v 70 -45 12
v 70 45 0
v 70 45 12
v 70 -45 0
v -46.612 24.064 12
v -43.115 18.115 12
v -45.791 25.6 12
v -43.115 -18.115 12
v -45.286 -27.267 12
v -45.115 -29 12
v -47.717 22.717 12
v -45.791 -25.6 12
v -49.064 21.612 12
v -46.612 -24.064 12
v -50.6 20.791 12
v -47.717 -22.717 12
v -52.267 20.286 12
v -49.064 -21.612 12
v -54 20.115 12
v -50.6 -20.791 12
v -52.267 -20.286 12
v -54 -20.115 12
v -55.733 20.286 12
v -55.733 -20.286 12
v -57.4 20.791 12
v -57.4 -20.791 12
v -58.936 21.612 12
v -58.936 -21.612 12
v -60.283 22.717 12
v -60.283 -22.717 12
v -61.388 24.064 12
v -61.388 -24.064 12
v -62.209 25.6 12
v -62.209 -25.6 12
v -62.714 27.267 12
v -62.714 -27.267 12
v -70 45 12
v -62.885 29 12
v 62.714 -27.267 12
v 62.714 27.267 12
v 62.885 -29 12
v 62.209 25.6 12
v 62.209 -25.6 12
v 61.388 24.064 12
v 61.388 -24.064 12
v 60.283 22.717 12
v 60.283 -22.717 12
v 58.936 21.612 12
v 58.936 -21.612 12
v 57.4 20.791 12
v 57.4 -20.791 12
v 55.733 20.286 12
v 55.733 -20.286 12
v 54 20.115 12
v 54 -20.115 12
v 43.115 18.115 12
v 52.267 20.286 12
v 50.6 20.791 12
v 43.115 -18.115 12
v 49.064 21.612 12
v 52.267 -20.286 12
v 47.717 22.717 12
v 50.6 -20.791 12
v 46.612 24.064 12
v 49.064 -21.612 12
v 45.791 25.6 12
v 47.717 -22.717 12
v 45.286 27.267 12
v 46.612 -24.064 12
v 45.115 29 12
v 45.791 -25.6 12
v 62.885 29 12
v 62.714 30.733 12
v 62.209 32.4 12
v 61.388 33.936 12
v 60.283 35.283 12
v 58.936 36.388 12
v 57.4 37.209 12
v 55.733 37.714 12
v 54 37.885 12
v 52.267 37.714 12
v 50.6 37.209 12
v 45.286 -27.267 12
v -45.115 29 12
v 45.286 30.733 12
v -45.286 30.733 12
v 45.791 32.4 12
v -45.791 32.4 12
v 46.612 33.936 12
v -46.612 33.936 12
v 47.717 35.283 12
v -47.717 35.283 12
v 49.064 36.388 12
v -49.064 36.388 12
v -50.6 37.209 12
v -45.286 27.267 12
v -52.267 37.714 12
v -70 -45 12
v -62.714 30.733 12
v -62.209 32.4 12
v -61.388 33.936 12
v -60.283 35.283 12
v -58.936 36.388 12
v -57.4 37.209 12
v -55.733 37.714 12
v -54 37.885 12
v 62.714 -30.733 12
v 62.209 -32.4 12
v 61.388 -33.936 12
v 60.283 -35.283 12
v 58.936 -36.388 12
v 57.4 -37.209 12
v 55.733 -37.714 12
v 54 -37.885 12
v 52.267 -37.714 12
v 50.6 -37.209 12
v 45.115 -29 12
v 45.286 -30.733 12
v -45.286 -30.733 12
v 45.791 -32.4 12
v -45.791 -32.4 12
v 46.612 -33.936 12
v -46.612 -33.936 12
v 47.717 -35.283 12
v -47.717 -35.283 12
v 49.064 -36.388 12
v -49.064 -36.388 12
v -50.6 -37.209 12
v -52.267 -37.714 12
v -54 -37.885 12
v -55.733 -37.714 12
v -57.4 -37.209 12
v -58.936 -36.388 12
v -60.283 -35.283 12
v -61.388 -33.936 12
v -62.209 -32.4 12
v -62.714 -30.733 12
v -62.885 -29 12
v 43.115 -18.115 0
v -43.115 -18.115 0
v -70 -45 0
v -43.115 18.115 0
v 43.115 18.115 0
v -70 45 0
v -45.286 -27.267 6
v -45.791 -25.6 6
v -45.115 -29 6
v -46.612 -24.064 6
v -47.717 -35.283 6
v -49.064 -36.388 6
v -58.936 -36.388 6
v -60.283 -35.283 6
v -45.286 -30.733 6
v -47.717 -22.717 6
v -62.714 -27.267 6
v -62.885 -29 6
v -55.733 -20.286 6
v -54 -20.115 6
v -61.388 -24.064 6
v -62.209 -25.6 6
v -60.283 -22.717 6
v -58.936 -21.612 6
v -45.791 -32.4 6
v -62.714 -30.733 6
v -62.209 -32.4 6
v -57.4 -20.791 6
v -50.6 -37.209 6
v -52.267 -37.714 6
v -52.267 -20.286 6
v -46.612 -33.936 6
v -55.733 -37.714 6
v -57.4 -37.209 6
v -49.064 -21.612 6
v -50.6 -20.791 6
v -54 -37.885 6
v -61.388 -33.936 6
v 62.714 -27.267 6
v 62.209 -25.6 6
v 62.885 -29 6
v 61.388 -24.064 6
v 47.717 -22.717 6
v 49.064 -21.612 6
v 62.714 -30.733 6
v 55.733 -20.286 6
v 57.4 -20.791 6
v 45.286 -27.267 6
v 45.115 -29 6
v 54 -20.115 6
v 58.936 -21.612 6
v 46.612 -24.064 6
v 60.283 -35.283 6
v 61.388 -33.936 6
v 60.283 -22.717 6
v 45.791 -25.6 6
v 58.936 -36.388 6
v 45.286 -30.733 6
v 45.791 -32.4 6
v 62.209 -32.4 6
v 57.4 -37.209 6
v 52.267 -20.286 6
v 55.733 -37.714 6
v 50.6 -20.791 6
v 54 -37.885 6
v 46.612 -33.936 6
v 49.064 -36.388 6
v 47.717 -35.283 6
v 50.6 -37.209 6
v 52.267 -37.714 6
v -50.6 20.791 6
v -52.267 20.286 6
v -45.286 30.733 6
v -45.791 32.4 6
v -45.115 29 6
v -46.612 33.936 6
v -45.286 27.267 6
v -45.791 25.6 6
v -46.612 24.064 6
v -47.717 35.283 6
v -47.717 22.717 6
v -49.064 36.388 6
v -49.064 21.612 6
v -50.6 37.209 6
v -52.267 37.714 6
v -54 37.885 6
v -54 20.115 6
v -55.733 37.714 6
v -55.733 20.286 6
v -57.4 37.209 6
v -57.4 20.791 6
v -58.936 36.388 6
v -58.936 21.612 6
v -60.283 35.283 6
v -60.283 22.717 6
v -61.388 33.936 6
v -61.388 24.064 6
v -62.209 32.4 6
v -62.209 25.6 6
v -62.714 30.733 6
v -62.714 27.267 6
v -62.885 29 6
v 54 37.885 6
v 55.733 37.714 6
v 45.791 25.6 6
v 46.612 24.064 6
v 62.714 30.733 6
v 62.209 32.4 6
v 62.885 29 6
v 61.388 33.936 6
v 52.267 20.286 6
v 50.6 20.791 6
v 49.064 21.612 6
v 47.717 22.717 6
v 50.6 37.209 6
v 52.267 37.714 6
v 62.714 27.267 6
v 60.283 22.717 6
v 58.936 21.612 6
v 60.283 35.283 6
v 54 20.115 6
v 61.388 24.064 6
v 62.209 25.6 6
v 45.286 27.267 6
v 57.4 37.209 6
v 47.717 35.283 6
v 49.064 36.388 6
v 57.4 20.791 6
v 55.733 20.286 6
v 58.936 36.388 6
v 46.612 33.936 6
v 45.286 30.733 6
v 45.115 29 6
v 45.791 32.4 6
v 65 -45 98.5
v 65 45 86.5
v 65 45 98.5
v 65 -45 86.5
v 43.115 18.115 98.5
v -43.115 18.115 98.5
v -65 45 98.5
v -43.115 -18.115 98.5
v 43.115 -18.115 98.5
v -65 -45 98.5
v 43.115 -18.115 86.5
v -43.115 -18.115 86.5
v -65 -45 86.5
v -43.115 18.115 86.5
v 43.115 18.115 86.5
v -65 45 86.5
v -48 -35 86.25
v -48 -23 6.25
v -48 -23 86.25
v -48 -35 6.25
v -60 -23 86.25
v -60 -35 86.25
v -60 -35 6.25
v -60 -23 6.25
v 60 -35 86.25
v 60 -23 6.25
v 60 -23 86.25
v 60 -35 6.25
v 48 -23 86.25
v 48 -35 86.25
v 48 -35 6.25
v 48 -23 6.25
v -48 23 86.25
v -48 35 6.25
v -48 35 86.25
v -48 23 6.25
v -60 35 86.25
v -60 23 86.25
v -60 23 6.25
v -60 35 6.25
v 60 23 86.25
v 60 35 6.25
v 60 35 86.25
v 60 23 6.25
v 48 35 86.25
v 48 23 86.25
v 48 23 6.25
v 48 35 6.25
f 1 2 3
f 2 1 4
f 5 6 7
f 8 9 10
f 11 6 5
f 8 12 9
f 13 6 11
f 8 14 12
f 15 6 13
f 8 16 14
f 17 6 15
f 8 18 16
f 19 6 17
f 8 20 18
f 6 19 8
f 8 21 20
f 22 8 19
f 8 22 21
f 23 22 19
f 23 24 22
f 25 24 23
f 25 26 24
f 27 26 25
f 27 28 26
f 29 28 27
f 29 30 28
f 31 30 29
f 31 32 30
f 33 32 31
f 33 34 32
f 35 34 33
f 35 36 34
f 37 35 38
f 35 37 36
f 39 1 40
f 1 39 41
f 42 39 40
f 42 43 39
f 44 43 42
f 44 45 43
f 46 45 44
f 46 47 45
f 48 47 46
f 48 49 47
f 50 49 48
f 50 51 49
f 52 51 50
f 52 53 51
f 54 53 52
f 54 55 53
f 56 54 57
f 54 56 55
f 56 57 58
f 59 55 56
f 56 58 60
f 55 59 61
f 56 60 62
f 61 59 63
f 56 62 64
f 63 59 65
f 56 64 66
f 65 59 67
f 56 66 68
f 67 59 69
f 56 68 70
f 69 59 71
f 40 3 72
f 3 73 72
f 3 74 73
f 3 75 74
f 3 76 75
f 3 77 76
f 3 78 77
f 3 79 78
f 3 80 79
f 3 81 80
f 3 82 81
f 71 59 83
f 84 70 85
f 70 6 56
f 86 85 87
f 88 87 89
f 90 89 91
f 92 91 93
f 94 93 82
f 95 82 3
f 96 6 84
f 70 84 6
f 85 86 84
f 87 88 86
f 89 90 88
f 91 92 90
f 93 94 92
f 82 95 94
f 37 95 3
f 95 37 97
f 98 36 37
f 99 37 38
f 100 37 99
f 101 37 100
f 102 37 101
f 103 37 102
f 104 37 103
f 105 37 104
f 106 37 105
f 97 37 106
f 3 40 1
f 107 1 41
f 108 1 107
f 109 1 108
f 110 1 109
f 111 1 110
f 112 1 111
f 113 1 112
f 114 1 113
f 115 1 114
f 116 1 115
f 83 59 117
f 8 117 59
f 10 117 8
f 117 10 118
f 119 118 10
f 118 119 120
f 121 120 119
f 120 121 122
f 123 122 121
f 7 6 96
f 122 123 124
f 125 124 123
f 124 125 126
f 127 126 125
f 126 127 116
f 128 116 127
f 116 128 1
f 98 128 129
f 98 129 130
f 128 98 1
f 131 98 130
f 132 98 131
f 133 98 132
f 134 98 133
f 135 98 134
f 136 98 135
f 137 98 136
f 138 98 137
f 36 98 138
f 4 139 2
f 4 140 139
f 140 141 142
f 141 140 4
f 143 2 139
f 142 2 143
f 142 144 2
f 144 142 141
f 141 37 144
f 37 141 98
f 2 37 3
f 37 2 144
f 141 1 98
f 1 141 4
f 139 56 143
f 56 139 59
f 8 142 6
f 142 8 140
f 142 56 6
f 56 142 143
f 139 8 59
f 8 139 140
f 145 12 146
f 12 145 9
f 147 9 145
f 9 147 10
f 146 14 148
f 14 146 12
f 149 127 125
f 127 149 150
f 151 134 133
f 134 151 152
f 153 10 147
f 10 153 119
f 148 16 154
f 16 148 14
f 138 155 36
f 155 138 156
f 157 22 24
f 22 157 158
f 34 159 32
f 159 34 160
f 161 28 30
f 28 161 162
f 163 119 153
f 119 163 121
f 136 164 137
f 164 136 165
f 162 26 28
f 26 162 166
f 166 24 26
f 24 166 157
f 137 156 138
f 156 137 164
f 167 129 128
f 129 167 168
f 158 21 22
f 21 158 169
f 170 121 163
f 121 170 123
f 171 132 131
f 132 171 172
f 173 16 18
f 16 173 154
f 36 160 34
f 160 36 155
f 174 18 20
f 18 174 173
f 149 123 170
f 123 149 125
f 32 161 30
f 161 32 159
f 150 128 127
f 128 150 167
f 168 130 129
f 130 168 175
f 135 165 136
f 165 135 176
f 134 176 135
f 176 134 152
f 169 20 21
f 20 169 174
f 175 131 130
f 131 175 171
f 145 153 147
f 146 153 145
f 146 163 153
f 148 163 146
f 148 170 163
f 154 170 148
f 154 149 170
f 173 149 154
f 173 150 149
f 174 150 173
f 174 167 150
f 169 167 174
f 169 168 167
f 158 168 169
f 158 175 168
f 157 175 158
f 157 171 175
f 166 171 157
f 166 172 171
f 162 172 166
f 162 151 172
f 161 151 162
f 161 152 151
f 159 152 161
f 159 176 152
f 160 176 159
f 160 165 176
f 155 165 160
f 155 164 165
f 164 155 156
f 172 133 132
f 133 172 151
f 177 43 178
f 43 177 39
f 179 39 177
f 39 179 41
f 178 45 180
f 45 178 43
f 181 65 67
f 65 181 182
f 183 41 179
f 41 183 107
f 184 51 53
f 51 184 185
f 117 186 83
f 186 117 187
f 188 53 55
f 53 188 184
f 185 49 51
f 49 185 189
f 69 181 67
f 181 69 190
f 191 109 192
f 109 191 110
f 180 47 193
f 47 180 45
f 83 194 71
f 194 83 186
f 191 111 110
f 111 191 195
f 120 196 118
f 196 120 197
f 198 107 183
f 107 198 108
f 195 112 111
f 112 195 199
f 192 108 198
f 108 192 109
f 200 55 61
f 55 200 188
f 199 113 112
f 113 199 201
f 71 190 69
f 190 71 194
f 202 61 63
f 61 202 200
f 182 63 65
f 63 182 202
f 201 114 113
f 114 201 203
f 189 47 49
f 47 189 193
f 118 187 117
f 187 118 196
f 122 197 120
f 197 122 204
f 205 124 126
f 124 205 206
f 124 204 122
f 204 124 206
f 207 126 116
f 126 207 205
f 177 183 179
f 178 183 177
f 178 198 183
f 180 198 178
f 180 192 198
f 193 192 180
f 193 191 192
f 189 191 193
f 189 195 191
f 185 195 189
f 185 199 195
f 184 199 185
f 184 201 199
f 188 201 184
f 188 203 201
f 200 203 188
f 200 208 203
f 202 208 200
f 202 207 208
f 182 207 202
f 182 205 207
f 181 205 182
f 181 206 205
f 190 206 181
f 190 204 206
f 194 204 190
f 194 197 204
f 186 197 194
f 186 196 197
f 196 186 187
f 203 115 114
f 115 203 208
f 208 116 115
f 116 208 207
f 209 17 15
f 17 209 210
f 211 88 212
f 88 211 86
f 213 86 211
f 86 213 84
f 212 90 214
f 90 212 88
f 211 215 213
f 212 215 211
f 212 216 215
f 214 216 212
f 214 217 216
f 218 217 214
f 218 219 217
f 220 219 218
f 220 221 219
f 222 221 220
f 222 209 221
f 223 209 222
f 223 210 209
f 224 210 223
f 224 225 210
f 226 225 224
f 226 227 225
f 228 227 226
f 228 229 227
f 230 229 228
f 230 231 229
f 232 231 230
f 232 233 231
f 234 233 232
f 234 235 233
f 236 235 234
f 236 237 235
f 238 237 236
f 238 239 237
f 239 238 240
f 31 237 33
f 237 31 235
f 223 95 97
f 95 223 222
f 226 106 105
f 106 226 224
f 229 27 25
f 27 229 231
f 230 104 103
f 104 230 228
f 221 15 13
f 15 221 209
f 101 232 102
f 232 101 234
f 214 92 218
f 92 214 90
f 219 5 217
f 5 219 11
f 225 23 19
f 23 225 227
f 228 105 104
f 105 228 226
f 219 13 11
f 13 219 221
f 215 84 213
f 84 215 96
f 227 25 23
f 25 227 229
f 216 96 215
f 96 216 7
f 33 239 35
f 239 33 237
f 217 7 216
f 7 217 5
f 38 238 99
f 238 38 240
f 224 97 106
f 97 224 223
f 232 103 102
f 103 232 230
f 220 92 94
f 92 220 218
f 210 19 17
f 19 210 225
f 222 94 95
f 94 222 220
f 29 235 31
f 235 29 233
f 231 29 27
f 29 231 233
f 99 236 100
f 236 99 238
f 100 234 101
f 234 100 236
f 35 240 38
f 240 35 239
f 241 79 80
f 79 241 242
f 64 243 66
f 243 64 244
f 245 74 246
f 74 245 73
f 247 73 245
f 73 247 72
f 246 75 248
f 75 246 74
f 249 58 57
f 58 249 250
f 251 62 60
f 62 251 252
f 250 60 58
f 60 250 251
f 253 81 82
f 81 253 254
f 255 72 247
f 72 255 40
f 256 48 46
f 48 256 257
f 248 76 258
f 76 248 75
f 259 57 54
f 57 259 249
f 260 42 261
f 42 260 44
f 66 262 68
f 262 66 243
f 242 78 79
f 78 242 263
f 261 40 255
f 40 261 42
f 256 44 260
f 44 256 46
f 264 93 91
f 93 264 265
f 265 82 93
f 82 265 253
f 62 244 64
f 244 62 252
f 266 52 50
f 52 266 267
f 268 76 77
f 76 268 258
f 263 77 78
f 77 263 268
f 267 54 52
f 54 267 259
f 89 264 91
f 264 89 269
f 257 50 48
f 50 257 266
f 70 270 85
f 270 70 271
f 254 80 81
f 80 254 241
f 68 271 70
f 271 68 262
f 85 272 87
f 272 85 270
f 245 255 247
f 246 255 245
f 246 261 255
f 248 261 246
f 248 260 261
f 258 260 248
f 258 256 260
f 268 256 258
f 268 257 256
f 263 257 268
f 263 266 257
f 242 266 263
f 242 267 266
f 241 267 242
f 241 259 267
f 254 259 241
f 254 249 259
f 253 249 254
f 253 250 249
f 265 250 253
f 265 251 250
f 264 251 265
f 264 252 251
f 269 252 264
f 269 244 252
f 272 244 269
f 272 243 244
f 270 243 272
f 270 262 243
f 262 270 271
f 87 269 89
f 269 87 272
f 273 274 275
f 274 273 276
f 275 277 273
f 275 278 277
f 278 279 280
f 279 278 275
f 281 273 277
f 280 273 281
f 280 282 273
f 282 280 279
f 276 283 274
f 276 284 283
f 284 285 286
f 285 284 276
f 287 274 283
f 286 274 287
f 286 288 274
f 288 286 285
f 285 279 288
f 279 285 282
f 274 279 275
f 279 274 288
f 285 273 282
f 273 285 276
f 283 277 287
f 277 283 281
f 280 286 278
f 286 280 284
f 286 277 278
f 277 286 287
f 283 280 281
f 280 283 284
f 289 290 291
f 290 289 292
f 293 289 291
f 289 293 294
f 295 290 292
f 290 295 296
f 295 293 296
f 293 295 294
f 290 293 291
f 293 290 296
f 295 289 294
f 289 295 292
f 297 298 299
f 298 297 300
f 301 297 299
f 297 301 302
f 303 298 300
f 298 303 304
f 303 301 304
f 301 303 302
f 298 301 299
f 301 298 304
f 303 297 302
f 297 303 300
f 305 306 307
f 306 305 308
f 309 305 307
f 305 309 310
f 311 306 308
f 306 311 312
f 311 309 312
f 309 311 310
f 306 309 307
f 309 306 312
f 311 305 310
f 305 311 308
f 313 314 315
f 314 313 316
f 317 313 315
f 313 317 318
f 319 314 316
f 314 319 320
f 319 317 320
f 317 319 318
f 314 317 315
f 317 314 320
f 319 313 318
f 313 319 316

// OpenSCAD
$fn = 32;

// ------------------------------------------------------------------------
// Frame cube: base 140 x 90 mm, posts 80 mm tall
// Every part is its own module, assembly() places every instance.
// ------------------------------------------------------------------------

// --- part 1 ---
module base_frame() {
  difference() {
    translate([-70, -45, 0]) cube([140, 90, 12]);
    translate([-43.115, -18.115, -1]) cube([86.23, 36.23, 14]);
    translate([-54, -29, 6]) cylinder(h = 7, d = 17.77);
    translate([54, -29, 6]) cylinder(h = 7, d = 17.77);
    translate([-54, 29, 6]) cylinder(h = 7, d = 17.77);
    translate([54, 29, 6]) cylinder(h = 7, d = 17.77);
  }
}

// --- part 2 ---
module corner_post() {
  translate([-6, -6, 0]) cube([12, 12, 80]);
}

// --- part 3 ---
module top_frame() {
  difference() {
    translate([-65, -45, 0]) cube([130, 90, 12]);
    translate([-43.115, -18.115, -1]) cube([86.23, 36.23, 14]);
  }
}

// --- assembly ---
module assembly() {
  color([0.80, 0.24, 0.20]) translate([0, 0, 0]) rotate([0, 0, 0]) base_frame();
  color([0.20, 0.45, 0.75]) translate([-54, -29, 6.25]) rotate([0, 0, 0]) corner_post();
  color([0.25, 0.62, 0.32]) translate([54, -29, 6.25]) rotate([0, 0, 0]) corner_post();
  color([0.92, 0.70, 0.18]) translate([-54, 29, 6.25]) rotate([0, 0, 0]) corner_post();
  color([0.58, 0.35, 0.70]) translate([54, 29, 6.25]) rotate([0, 0, 0]) corner_post();
  color([0.16, 0.66, 0.66]) translate([0, 0, 86.5]) rotate([0, 0, 0]) top_frame();
}

assembly();
